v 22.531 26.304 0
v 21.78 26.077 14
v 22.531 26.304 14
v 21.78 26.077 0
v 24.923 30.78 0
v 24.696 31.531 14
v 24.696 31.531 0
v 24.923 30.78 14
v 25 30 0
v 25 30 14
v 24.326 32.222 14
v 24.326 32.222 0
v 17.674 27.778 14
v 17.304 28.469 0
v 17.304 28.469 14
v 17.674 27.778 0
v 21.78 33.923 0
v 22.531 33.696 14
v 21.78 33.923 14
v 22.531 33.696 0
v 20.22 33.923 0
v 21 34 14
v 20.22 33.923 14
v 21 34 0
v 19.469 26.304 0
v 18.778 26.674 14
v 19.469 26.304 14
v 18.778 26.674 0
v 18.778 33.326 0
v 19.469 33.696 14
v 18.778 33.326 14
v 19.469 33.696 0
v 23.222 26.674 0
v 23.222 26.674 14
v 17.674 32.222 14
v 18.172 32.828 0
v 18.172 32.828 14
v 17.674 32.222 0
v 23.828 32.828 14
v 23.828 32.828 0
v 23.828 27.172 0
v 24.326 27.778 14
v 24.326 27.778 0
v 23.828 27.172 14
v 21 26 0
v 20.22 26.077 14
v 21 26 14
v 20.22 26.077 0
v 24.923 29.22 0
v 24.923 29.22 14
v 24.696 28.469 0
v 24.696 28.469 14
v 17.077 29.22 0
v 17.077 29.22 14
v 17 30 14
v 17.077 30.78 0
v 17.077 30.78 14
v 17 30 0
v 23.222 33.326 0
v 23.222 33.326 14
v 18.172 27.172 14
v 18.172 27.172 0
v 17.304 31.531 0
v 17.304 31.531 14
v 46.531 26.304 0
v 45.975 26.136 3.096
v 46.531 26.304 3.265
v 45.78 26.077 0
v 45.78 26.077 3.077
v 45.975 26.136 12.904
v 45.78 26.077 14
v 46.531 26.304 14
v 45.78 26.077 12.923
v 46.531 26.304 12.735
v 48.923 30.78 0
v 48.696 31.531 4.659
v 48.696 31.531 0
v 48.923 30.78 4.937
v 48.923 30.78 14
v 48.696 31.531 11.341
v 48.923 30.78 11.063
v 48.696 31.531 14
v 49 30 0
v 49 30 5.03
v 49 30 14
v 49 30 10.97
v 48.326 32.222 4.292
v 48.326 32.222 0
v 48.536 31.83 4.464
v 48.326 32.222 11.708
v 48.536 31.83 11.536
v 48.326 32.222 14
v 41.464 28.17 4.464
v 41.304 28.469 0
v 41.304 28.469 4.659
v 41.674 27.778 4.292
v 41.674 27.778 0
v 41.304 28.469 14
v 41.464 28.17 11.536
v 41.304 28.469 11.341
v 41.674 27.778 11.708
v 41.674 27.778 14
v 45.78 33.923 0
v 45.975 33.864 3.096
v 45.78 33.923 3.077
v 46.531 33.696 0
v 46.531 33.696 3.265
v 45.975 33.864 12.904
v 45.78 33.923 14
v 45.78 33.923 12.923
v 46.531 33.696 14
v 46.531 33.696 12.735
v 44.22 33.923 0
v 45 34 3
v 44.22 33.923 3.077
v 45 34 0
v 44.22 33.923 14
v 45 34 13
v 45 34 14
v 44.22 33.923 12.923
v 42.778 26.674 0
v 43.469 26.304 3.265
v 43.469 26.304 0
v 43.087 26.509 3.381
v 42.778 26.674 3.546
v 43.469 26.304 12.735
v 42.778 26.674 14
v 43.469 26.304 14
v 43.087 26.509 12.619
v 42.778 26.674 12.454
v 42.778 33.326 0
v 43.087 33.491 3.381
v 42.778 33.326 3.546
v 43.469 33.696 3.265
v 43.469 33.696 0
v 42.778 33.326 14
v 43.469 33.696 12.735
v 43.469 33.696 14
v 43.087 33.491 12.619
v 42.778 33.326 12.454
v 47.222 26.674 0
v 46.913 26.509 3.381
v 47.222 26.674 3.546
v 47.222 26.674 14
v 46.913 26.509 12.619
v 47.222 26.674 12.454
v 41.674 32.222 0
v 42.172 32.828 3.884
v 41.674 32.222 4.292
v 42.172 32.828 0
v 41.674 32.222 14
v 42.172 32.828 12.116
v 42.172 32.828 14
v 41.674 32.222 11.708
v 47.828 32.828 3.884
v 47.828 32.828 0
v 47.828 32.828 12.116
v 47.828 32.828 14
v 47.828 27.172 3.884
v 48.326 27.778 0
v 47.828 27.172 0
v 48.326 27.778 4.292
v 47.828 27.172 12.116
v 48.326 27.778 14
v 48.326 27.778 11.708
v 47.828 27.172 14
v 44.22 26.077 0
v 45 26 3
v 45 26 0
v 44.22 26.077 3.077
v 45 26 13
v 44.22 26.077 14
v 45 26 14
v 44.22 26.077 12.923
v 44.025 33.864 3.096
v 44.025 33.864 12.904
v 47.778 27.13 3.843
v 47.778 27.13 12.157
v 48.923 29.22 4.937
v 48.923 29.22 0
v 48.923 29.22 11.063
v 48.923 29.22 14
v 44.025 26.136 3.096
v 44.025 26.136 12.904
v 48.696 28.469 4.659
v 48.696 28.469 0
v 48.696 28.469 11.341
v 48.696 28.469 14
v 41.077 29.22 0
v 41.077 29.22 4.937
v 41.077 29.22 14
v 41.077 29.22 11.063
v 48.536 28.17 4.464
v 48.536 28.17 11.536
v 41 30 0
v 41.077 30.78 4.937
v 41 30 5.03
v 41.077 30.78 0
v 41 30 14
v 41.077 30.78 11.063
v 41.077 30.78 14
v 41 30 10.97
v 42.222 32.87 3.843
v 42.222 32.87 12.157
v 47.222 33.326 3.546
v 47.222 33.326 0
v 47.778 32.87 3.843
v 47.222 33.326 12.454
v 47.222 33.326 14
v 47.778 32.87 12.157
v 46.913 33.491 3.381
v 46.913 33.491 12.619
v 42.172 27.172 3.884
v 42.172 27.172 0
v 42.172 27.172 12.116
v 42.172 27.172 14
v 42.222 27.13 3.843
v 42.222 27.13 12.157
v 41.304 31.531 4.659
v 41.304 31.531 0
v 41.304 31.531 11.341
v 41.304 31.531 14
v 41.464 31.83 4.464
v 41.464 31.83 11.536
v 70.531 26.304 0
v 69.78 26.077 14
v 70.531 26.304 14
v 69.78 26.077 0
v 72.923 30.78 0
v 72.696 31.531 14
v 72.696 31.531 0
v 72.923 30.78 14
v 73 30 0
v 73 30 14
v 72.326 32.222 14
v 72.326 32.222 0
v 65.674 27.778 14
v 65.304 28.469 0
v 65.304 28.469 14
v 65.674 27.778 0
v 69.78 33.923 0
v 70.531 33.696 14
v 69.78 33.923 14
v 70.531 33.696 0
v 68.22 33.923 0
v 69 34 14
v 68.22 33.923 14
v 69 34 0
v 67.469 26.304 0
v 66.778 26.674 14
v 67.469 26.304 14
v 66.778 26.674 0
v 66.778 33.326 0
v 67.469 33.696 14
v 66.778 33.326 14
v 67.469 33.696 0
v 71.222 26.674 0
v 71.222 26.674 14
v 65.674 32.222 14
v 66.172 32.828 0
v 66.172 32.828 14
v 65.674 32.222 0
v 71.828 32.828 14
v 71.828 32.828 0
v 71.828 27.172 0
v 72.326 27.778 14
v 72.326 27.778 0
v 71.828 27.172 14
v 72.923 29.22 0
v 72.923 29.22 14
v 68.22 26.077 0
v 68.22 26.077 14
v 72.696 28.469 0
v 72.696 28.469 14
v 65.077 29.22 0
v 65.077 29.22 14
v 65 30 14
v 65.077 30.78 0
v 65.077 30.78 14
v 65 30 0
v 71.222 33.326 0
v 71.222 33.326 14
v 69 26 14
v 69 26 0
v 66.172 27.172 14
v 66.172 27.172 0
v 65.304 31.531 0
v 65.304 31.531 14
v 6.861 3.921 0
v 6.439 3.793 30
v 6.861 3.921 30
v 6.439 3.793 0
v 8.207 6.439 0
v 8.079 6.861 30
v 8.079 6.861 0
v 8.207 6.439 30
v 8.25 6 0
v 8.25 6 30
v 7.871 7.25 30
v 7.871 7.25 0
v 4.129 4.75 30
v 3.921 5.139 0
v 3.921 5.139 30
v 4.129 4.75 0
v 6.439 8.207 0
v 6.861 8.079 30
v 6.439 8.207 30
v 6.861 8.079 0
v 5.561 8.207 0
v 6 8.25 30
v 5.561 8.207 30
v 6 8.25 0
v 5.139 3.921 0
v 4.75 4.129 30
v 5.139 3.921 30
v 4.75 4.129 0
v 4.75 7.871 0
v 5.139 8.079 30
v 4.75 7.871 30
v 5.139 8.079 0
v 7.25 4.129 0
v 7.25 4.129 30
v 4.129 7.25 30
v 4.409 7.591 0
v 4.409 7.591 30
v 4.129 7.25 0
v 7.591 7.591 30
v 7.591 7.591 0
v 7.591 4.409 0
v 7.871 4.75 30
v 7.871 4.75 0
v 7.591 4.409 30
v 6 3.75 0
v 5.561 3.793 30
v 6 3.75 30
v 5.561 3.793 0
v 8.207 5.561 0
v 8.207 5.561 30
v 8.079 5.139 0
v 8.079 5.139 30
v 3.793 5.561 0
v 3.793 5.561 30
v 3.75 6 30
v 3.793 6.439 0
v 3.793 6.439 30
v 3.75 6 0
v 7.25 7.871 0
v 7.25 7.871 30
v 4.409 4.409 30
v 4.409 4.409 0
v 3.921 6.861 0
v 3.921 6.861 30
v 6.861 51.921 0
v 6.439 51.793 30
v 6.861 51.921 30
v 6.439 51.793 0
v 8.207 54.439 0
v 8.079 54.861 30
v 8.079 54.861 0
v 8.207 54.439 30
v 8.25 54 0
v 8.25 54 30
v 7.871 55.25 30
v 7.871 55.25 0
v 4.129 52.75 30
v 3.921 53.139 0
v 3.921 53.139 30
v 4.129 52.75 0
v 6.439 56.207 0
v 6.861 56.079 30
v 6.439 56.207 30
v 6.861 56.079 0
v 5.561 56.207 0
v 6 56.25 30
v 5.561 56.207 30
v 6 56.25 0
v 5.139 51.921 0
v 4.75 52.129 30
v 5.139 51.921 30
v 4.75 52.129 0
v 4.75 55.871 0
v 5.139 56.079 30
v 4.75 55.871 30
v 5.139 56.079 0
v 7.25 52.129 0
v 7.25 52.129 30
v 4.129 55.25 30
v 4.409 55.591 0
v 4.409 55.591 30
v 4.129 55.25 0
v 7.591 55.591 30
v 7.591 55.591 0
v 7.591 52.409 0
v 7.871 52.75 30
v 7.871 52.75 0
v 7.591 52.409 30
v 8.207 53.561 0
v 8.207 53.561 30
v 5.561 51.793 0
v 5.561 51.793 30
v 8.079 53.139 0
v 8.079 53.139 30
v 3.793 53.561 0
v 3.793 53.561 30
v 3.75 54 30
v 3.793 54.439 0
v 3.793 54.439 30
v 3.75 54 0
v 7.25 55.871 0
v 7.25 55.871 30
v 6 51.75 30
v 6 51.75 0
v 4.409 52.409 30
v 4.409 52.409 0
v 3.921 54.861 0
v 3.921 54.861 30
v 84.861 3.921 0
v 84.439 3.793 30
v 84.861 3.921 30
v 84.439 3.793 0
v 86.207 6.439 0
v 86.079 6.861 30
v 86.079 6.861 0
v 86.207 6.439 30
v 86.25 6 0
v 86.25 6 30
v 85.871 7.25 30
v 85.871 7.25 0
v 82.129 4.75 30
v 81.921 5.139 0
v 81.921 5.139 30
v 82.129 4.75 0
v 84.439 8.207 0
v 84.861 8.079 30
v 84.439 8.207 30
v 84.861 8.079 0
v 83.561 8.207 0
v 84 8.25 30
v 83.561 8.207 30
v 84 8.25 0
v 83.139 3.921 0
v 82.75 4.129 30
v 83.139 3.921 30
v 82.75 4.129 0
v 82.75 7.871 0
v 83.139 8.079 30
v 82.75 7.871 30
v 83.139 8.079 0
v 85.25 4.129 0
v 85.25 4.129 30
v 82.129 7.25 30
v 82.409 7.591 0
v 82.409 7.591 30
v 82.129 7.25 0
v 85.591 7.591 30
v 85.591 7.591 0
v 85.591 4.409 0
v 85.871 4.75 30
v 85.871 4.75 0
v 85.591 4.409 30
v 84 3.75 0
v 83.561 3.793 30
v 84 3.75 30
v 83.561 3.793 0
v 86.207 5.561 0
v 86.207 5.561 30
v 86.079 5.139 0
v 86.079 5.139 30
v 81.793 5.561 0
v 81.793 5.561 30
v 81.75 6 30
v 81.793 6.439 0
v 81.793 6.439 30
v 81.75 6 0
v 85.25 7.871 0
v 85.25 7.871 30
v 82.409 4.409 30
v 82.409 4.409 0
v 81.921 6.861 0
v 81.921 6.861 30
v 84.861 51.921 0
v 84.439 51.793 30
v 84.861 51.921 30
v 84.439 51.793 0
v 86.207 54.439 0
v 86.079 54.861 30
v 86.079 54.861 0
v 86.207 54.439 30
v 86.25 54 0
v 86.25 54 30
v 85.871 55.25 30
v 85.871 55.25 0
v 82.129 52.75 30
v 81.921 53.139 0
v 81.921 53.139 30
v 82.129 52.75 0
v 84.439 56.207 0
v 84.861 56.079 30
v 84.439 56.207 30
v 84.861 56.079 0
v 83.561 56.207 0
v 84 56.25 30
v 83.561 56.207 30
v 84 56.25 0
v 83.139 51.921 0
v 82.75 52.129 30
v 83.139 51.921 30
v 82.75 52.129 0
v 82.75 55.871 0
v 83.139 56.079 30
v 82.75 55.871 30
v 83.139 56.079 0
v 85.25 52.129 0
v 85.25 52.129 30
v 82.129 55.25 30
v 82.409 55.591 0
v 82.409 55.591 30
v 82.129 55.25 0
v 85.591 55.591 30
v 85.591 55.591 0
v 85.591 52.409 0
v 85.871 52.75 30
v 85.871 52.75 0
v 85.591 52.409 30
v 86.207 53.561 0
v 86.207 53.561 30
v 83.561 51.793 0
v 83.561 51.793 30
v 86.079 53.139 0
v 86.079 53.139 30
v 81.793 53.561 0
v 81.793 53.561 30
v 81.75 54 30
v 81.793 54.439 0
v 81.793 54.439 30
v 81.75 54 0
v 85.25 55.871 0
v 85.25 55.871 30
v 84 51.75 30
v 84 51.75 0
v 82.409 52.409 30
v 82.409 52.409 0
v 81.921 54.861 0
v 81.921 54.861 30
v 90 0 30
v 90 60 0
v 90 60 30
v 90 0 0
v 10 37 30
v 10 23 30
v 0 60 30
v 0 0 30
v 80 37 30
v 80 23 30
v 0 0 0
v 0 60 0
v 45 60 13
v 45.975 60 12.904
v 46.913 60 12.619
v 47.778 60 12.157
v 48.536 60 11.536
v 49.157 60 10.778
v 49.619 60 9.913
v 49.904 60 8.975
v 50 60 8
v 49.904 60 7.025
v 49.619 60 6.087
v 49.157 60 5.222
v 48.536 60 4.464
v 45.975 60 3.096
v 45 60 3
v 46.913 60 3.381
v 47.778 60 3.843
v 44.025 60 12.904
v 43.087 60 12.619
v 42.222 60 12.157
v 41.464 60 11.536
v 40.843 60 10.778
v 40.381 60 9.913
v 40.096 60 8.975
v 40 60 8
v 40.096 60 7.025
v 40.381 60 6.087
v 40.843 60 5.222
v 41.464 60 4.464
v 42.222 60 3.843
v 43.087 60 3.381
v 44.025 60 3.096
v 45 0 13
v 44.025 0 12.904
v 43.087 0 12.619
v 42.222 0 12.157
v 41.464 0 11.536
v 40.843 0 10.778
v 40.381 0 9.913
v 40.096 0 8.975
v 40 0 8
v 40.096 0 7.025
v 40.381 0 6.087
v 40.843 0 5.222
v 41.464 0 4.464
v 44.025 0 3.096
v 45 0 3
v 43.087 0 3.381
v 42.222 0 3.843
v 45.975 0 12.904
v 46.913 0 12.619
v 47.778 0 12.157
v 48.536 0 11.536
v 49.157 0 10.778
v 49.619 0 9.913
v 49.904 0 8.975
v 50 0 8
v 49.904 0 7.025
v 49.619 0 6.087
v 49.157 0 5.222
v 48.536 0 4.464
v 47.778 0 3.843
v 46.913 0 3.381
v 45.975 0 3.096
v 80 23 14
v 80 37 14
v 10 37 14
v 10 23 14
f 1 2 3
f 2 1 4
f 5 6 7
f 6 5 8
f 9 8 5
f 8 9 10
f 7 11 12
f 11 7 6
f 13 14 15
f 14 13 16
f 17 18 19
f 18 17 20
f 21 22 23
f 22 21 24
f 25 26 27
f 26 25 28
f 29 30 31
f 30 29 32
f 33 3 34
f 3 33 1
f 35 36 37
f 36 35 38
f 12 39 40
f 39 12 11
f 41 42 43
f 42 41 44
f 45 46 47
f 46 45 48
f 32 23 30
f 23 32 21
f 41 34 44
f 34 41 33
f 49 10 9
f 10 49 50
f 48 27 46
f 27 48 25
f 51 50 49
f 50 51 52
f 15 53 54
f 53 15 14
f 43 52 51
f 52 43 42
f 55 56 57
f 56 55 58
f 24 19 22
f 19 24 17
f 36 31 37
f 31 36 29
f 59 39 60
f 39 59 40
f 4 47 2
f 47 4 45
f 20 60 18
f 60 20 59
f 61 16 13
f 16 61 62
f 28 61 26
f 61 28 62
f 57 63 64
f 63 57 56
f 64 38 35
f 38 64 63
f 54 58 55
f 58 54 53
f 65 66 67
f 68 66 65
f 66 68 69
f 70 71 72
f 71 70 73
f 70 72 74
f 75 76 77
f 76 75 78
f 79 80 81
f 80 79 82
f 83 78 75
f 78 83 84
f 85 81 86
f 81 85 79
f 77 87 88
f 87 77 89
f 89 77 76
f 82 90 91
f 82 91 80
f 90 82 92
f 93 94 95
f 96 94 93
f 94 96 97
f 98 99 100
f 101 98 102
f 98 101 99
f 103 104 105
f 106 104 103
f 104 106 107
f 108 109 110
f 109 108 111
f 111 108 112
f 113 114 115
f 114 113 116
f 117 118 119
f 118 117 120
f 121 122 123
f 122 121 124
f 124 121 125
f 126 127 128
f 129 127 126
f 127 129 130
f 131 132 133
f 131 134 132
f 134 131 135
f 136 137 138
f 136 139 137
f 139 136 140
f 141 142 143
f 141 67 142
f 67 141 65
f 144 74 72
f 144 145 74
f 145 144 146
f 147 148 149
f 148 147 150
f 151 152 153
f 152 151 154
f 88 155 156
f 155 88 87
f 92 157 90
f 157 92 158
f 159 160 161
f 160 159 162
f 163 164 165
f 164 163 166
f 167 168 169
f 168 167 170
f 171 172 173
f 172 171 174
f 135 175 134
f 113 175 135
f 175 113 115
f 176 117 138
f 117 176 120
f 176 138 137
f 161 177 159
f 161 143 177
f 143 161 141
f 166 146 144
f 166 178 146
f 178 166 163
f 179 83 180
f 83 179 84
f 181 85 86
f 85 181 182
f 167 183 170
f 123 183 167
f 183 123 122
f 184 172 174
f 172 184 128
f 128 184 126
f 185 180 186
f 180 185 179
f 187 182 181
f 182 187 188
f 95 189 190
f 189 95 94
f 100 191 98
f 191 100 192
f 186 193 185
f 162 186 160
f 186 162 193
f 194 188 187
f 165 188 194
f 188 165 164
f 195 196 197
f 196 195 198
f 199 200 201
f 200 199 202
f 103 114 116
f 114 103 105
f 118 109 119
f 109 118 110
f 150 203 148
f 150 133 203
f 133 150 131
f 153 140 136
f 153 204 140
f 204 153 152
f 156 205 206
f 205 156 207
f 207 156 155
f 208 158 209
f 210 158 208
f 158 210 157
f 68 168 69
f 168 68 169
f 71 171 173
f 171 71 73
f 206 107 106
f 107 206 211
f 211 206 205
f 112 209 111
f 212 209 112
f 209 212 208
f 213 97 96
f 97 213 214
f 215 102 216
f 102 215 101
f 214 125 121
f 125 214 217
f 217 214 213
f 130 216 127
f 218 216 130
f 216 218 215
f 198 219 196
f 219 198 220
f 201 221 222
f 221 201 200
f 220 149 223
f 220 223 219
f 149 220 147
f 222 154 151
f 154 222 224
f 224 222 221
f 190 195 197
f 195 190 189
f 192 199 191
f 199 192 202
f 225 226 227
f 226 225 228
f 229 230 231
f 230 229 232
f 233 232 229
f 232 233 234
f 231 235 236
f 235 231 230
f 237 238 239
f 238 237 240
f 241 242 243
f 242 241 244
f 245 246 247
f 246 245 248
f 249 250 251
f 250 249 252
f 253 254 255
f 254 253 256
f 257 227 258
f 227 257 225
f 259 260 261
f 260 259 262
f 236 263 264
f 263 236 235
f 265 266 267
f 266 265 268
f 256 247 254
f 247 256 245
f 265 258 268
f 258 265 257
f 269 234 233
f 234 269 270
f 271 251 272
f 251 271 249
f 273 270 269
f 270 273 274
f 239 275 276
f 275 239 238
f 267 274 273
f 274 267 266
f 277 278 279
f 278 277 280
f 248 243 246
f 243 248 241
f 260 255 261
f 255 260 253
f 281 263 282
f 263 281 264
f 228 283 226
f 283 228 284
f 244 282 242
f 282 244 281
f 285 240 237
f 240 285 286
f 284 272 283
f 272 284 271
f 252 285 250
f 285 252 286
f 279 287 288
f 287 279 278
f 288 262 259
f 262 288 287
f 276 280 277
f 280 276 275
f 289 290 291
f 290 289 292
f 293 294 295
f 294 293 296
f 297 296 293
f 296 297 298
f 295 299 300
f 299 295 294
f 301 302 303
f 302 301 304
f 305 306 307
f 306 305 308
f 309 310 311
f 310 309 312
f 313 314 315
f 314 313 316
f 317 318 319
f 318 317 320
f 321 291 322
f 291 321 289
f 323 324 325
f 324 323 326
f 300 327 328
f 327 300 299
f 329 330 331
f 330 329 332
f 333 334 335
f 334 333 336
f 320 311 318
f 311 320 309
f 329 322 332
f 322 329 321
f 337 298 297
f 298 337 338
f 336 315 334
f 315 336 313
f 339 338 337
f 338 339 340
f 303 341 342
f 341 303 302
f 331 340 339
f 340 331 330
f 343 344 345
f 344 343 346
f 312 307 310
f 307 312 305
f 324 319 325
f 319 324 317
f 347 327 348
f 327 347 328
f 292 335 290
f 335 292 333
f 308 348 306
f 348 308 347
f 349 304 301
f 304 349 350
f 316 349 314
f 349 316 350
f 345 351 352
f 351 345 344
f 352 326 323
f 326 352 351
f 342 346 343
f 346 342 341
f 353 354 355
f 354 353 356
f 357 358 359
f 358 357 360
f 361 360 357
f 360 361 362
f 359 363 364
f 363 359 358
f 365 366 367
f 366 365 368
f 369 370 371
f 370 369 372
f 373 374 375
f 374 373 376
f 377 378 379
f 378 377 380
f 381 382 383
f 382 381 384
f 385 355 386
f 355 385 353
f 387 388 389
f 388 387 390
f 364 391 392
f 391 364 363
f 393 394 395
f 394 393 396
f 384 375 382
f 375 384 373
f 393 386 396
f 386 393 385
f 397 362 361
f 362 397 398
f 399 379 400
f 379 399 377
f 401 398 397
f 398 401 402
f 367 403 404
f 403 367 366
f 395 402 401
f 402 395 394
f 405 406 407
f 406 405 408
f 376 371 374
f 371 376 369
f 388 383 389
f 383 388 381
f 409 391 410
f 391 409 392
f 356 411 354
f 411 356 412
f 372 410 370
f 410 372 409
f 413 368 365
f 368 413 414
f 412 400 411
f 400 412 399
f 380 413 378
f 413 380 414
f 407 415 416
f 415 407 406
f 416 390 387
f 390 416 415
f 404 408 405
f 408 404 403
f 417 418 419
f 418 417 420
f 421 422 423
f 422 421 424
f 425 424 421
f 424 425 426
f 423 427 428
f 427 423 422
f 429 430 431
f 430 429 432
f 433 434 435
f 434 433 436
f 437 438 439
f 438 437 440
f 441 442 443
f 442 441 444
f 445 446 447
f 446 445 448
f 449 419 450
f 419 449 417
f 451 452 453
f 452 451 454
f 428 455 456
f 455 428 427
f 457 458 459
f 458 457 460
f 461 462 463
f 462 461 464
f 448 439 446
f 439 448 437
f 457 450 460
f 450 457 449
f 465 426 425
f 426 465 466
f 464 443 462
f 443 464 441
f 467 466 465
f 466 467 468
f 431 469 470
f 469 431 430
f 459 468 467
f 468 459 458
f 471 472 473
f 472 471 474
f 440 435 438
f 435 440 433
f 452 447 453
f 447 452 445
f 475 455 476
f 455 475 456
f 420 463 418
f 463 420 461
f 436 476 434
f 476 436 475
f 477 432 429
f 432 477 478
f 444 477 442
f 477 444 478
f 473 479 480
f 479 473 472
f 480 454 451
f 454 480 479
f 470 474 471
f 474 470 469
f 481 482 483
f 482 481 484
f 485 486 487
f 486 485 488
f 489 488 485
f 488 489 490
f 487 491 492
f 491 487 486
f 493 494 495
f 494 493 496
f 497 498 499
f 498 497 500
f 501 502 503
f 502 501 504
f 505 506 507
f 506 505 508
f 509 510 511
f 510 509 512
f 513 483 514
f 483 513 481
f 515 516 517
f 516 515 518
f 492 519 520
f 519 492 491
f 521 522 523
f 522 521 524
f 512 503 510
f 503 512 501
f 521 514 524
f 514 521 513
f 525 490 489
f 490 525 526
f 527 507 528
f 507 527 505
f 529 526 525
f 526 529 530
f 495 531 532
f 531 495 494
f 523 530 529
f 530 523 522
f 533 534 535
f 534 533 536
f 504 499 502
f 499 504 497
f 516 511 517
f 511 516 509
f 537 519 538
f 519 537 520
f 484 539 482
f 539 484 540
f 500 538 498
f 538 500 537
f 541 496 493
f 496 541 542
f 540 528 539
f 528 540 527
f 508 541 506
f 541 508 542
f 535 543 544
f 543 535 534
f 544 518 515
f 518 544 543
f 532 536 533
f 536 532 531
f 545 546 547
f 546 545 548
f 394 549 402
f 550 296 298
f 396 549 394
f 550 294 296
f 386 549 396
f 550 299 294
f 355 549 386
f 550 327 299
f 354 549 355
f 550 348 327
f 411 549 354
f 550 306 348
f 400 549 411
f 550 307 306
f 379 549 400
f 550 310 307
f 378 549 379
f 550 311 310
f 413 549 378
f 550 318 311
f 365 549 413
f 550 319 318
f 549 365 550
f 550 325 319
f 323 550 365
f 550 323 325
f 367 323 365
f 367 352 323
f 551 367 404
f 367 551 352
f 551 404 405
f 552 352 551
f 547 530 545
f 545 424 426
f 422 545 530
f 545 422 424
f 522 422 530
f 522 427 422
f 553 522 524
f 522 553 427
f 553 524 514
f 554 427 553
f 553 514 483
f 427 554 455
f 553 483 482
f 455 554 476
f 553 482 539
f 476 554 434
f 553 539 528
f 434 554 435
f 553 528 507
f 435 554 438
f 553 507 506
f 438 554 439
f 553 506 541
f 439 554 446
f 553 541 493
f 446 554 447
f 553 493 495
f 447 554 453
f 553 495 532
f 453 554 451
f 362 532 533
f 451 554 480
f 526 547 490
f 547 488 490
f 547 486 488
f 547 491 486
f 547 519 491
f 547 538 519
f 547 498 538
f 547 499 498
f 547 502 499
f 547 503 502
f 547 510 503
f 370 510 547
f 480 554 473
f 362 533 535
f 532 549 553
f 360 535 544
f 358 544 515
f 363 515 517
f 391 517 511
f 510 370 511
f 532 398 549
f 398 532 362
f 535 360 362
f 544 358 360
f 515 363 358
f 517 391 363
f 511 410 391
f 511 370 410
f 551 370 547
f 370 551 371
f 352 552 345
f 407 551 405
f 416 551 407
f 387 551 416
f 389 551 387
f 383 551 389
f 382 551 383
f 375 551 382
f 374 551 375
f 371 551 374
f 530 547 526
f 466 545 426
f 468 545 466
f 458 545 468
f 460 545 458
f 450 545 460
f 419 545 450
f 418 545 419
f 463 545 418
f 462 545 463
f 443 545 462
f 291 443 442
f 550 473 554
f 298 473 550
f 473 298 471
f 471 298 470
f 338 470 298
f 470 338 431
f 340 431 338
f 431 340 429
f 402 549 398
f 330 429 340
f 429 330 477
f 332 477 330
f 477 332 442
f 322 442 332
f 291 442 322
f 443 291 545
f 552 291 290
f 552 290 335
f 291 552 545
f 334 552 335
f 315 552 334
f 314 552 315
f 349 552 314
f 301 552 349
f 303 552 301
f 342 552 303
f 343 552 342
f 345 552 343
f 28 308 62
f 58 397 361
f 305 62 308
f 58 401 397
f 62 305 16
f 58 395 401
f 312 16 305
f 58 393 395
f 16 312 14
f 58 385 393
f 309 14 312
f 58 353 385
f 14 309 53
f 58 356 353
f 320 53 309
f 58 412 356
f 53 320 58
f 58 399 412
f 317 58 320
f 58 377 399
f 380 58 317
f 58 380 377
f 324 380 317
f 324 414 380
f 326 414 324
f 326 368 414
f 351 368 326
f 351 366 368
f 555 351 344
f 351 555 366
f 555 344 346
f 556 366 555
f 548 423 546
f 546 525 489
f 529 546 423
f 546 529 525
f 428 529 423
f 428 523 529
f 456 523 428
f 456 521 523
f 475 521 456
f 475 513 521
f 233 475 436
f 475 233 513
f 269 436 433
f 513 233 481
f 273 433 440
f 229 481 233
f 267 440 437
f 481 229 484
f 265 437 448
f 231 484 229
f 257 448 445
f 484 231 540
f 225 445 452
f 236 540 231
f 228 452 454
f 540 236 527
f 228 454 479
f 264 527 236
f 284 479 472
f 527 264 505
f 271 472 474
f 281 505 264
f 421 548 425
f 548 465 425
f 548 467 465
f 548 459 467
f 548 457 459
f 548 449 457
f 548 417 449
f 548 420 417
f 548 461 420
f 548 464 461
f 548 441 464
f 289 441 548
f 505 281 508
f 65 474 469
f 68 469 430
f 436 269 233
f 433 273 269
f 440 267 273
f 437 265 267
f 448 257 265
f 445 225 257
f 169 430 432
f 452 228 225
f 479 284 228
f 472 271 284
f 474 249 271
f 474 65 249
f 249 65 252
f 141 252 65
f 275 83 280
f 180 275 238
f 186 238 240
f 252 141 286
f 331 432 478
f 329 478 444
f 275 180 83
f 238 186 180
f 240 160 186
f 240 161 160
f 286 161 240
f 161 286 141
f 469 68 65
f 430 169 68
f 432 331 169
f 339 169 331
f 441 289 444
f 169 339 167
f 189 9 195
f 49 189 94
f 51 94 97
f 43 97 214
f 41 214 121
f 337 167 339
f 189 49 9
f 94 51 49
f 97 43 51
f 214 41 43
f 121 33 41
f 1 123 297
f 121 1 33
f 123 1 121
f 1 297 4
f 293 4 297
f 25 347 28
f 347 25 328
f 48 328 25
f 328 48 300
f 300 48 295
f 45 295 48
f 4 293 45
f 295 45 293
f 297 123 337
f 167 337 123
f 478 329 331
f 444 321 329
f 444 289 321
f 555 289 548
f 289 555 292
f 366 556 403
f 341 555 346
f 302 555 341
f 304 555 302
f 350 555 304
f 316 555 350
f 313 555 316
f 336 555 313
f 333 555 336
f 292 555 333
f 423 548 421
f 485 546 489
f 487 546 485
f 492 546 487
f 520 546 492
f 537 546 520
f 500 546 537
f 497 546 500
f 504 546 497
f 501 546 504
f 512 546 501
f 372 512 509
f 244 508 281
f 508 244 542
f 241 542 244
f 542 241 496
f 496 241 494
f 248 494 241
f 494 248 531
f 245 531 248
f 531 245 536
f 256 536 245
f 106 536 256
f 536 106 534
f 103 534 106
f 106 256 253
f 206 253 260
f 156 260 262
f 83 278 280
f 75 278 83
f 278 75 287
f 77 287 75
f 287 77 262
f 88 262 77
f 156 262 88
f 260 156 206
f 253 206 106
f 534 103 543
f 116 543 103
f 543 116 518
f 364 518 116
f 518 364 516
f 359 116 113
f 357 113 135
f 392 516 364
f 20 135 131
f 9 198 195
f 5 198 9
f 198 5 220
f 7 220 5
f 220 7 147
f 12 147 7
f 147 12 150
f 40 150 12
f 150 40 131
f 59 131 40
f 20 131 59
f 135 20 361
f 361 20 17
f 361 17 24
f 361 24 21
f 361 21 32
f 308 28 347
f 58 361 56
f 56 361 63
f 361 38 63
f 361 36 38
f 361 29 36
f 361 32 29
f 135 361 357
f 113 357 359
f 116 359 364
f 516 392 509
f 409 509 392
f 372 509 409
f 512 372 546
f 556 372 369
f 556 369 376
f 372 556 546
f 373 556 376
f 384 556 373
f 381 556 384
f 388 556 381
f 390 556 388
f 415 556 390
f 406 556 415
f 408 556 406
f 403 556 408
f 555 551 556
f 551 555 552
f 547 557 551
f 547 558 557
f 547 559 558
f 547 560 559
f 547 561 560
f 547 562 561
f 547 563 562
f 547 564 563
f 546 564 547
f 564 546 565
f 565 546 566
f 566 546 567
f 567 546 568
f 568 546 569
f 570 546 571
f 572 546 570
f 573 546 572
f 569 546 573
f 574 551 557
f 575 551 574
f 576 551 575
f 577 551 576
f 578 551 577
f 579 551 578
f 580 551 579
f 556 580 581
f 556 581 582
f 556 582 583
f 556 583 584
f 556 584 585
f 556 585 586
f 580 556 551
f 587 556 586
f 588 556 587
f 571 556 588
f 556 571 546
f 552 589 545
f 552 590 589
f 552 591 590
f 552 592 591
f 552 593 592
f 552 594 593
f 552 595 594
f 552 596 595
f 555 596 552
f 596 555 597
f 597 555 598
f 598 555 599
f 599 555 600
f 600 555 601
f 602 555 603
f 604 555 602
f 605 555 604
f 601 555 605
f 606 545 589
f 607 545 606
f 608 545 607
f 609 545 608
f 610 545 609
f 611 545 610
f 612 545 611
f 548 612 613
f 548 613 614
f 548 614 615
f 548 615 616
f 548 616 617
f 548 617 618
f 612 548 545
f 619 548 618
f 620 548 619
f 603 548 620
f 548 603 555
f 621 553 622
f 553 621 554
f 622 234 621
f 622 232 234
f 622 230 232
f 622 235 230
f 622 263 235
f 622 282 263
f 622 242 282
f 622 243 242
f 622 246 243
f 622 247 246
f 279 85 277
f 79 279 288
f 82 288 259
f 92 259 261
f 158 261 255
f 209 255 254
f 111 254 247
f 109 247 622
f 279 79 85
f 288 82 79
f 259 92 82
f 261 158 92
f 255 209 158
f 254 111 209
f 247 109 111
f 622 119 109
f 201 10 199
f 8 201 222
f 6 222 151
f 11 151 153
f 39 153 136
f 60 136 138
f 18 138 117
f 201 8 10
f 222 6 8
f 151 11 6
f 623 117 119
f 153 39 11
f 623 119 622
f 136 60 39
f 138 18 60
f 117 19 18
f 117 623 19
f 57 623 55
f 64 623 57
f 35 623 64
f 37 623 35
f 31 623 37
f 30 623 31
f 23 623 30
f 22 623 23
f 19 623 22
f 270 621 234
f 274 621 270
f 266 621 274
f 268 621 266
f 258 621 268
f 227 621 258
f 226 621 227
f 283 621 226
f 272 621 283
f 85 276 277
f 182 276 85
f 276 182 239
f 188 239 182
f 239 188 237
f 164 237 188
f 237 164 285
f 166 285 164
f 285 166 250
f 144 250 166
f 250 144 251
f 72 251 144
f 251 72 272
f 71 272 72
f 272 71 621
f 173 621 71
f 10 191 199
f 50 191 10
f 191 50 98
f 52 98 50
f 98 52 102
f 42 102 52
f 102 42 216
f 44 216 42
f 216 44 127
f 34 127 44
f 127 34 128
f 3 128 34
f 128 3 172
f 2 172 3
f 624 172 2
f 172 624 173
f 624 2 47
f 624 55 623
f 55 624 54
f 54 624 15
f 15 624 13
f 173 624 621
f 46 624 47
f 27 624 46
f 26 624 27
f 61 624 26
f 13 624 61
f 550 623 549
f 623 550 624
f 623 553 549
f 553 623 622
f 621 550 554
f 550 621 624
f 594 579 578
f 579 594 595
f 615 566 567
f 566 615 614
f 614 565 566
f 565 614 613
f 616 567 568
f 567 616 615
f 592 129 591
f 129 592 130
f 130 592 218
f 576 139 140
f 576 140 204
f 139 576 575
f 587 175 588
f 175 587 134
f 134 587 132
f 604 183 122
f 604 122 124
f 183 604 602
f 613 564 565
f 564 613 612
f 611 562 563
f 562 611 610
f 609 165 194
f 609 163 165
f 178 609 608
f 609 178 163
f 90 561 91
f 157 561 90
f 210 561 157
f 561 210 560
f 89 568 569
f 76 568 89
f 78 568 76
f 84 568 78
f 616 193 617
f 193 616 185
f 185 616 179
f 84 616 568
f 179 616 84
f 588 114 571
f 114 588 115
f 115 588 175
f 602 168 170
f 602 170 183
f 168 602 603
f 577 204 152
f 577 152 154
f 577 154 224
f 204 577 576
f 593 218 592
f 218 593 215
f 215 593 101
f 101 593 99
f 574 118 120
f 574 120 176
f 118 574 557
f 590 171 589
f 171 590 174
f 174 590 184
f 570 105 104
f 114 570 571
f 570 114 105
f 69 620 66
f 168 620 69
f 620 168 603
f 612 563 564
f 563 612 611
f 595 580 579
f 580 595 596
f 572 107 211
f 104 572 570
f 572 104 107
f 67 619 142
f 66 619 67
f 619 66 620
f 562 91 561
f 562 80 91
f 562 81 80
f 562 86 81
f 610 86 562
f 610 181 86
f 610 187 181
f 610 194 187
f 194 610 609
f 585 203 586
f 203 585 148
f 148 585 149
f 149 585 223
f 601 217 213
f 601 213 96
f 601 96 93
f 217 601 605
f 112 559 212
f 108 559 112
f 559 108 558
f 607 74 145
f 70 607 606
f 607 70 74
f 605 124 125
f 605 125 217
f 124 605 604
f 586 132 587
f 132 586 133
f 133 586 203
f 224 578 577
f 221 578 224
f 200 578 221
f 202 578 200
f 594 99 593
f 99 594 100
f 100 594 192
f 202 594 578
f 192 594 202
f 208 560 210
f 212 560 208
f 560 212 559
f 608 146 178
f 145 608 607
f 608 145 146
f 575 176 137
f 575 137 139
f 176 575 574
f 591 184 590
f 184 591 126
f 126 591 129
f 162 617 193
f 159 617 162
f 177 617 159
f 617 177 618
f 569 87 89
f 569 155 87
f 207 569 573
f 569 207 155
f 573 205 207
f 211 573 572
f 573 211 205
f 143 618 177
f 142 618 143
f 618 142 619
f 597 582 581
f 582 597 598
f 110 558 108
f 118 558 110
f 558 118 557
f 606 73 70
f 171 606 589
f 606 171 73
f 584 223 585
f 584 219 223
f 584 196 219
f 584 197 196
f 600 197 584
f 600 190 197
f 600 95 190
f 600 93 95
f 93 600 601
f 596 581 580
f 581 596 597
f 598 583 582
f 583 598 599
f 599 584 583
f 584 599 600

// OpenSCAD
$fn = 32;

// ----------------------------------------------------------------------
// Manifold block: side_outlet manifold
// ----------------------------------------------------------------------

// --- parameters (mm) ---
block_l = 90;             // block length, X
block_w = 60;             // block width, Y
block_h = 30;             // block height, Z
port_d = 8;               // port bore diameter
port_pitch = 24;          // port pitch along X
gallery_d = 14;           // top gallery width, Y
gallery_depth = 16;       // gallery pocket depth
wall_p = 10;              // gallery end wall thickness, X
mnt_d = 4.5;              // mounting hole diameter
mnt_in = 6;               // mounting hole inset from the edges
out_d = 10;               // outlet bore diameter
out_z = 8;                // outlet axis height
fit_tol = 0.05;           // tolerance for press fits, mm
free_tol = 0.3;           // tolerance for clearance fits, mm

n_ports = 3;  // ports in the row
port_x0 = (block_l - (n_ports - 1) * port_pitch) / 2;  // first port X

difference() {
  cube([block_l, block_w, block_h]);
  for (i = [0 : n_ports - 1])
    translate([port_x0 + i * port_pitch, block_w / 2, -1])
      cylinder(h = block_h + 2, d = port_d);
  translate([wall_p, block_w / 2 - gallery_d / 2, block_h - gallery_depth])
    cube([block_l - 2 * wall_p, gallery_d, gallery_depth + 1]);
  for (cx = [mnt_in, block_l - mnt_in])
    for (cy = [mnt_in, block_w - mnt_in])
      translate([cx, cy, -1]) cylinder(h = block_h + 2, d = mnt_d);
  translate([block_l / 2, -1, out_z]) rotate([-90, 0, 0])
    cylinder(h = block_w + 2, d = out_d);
}
